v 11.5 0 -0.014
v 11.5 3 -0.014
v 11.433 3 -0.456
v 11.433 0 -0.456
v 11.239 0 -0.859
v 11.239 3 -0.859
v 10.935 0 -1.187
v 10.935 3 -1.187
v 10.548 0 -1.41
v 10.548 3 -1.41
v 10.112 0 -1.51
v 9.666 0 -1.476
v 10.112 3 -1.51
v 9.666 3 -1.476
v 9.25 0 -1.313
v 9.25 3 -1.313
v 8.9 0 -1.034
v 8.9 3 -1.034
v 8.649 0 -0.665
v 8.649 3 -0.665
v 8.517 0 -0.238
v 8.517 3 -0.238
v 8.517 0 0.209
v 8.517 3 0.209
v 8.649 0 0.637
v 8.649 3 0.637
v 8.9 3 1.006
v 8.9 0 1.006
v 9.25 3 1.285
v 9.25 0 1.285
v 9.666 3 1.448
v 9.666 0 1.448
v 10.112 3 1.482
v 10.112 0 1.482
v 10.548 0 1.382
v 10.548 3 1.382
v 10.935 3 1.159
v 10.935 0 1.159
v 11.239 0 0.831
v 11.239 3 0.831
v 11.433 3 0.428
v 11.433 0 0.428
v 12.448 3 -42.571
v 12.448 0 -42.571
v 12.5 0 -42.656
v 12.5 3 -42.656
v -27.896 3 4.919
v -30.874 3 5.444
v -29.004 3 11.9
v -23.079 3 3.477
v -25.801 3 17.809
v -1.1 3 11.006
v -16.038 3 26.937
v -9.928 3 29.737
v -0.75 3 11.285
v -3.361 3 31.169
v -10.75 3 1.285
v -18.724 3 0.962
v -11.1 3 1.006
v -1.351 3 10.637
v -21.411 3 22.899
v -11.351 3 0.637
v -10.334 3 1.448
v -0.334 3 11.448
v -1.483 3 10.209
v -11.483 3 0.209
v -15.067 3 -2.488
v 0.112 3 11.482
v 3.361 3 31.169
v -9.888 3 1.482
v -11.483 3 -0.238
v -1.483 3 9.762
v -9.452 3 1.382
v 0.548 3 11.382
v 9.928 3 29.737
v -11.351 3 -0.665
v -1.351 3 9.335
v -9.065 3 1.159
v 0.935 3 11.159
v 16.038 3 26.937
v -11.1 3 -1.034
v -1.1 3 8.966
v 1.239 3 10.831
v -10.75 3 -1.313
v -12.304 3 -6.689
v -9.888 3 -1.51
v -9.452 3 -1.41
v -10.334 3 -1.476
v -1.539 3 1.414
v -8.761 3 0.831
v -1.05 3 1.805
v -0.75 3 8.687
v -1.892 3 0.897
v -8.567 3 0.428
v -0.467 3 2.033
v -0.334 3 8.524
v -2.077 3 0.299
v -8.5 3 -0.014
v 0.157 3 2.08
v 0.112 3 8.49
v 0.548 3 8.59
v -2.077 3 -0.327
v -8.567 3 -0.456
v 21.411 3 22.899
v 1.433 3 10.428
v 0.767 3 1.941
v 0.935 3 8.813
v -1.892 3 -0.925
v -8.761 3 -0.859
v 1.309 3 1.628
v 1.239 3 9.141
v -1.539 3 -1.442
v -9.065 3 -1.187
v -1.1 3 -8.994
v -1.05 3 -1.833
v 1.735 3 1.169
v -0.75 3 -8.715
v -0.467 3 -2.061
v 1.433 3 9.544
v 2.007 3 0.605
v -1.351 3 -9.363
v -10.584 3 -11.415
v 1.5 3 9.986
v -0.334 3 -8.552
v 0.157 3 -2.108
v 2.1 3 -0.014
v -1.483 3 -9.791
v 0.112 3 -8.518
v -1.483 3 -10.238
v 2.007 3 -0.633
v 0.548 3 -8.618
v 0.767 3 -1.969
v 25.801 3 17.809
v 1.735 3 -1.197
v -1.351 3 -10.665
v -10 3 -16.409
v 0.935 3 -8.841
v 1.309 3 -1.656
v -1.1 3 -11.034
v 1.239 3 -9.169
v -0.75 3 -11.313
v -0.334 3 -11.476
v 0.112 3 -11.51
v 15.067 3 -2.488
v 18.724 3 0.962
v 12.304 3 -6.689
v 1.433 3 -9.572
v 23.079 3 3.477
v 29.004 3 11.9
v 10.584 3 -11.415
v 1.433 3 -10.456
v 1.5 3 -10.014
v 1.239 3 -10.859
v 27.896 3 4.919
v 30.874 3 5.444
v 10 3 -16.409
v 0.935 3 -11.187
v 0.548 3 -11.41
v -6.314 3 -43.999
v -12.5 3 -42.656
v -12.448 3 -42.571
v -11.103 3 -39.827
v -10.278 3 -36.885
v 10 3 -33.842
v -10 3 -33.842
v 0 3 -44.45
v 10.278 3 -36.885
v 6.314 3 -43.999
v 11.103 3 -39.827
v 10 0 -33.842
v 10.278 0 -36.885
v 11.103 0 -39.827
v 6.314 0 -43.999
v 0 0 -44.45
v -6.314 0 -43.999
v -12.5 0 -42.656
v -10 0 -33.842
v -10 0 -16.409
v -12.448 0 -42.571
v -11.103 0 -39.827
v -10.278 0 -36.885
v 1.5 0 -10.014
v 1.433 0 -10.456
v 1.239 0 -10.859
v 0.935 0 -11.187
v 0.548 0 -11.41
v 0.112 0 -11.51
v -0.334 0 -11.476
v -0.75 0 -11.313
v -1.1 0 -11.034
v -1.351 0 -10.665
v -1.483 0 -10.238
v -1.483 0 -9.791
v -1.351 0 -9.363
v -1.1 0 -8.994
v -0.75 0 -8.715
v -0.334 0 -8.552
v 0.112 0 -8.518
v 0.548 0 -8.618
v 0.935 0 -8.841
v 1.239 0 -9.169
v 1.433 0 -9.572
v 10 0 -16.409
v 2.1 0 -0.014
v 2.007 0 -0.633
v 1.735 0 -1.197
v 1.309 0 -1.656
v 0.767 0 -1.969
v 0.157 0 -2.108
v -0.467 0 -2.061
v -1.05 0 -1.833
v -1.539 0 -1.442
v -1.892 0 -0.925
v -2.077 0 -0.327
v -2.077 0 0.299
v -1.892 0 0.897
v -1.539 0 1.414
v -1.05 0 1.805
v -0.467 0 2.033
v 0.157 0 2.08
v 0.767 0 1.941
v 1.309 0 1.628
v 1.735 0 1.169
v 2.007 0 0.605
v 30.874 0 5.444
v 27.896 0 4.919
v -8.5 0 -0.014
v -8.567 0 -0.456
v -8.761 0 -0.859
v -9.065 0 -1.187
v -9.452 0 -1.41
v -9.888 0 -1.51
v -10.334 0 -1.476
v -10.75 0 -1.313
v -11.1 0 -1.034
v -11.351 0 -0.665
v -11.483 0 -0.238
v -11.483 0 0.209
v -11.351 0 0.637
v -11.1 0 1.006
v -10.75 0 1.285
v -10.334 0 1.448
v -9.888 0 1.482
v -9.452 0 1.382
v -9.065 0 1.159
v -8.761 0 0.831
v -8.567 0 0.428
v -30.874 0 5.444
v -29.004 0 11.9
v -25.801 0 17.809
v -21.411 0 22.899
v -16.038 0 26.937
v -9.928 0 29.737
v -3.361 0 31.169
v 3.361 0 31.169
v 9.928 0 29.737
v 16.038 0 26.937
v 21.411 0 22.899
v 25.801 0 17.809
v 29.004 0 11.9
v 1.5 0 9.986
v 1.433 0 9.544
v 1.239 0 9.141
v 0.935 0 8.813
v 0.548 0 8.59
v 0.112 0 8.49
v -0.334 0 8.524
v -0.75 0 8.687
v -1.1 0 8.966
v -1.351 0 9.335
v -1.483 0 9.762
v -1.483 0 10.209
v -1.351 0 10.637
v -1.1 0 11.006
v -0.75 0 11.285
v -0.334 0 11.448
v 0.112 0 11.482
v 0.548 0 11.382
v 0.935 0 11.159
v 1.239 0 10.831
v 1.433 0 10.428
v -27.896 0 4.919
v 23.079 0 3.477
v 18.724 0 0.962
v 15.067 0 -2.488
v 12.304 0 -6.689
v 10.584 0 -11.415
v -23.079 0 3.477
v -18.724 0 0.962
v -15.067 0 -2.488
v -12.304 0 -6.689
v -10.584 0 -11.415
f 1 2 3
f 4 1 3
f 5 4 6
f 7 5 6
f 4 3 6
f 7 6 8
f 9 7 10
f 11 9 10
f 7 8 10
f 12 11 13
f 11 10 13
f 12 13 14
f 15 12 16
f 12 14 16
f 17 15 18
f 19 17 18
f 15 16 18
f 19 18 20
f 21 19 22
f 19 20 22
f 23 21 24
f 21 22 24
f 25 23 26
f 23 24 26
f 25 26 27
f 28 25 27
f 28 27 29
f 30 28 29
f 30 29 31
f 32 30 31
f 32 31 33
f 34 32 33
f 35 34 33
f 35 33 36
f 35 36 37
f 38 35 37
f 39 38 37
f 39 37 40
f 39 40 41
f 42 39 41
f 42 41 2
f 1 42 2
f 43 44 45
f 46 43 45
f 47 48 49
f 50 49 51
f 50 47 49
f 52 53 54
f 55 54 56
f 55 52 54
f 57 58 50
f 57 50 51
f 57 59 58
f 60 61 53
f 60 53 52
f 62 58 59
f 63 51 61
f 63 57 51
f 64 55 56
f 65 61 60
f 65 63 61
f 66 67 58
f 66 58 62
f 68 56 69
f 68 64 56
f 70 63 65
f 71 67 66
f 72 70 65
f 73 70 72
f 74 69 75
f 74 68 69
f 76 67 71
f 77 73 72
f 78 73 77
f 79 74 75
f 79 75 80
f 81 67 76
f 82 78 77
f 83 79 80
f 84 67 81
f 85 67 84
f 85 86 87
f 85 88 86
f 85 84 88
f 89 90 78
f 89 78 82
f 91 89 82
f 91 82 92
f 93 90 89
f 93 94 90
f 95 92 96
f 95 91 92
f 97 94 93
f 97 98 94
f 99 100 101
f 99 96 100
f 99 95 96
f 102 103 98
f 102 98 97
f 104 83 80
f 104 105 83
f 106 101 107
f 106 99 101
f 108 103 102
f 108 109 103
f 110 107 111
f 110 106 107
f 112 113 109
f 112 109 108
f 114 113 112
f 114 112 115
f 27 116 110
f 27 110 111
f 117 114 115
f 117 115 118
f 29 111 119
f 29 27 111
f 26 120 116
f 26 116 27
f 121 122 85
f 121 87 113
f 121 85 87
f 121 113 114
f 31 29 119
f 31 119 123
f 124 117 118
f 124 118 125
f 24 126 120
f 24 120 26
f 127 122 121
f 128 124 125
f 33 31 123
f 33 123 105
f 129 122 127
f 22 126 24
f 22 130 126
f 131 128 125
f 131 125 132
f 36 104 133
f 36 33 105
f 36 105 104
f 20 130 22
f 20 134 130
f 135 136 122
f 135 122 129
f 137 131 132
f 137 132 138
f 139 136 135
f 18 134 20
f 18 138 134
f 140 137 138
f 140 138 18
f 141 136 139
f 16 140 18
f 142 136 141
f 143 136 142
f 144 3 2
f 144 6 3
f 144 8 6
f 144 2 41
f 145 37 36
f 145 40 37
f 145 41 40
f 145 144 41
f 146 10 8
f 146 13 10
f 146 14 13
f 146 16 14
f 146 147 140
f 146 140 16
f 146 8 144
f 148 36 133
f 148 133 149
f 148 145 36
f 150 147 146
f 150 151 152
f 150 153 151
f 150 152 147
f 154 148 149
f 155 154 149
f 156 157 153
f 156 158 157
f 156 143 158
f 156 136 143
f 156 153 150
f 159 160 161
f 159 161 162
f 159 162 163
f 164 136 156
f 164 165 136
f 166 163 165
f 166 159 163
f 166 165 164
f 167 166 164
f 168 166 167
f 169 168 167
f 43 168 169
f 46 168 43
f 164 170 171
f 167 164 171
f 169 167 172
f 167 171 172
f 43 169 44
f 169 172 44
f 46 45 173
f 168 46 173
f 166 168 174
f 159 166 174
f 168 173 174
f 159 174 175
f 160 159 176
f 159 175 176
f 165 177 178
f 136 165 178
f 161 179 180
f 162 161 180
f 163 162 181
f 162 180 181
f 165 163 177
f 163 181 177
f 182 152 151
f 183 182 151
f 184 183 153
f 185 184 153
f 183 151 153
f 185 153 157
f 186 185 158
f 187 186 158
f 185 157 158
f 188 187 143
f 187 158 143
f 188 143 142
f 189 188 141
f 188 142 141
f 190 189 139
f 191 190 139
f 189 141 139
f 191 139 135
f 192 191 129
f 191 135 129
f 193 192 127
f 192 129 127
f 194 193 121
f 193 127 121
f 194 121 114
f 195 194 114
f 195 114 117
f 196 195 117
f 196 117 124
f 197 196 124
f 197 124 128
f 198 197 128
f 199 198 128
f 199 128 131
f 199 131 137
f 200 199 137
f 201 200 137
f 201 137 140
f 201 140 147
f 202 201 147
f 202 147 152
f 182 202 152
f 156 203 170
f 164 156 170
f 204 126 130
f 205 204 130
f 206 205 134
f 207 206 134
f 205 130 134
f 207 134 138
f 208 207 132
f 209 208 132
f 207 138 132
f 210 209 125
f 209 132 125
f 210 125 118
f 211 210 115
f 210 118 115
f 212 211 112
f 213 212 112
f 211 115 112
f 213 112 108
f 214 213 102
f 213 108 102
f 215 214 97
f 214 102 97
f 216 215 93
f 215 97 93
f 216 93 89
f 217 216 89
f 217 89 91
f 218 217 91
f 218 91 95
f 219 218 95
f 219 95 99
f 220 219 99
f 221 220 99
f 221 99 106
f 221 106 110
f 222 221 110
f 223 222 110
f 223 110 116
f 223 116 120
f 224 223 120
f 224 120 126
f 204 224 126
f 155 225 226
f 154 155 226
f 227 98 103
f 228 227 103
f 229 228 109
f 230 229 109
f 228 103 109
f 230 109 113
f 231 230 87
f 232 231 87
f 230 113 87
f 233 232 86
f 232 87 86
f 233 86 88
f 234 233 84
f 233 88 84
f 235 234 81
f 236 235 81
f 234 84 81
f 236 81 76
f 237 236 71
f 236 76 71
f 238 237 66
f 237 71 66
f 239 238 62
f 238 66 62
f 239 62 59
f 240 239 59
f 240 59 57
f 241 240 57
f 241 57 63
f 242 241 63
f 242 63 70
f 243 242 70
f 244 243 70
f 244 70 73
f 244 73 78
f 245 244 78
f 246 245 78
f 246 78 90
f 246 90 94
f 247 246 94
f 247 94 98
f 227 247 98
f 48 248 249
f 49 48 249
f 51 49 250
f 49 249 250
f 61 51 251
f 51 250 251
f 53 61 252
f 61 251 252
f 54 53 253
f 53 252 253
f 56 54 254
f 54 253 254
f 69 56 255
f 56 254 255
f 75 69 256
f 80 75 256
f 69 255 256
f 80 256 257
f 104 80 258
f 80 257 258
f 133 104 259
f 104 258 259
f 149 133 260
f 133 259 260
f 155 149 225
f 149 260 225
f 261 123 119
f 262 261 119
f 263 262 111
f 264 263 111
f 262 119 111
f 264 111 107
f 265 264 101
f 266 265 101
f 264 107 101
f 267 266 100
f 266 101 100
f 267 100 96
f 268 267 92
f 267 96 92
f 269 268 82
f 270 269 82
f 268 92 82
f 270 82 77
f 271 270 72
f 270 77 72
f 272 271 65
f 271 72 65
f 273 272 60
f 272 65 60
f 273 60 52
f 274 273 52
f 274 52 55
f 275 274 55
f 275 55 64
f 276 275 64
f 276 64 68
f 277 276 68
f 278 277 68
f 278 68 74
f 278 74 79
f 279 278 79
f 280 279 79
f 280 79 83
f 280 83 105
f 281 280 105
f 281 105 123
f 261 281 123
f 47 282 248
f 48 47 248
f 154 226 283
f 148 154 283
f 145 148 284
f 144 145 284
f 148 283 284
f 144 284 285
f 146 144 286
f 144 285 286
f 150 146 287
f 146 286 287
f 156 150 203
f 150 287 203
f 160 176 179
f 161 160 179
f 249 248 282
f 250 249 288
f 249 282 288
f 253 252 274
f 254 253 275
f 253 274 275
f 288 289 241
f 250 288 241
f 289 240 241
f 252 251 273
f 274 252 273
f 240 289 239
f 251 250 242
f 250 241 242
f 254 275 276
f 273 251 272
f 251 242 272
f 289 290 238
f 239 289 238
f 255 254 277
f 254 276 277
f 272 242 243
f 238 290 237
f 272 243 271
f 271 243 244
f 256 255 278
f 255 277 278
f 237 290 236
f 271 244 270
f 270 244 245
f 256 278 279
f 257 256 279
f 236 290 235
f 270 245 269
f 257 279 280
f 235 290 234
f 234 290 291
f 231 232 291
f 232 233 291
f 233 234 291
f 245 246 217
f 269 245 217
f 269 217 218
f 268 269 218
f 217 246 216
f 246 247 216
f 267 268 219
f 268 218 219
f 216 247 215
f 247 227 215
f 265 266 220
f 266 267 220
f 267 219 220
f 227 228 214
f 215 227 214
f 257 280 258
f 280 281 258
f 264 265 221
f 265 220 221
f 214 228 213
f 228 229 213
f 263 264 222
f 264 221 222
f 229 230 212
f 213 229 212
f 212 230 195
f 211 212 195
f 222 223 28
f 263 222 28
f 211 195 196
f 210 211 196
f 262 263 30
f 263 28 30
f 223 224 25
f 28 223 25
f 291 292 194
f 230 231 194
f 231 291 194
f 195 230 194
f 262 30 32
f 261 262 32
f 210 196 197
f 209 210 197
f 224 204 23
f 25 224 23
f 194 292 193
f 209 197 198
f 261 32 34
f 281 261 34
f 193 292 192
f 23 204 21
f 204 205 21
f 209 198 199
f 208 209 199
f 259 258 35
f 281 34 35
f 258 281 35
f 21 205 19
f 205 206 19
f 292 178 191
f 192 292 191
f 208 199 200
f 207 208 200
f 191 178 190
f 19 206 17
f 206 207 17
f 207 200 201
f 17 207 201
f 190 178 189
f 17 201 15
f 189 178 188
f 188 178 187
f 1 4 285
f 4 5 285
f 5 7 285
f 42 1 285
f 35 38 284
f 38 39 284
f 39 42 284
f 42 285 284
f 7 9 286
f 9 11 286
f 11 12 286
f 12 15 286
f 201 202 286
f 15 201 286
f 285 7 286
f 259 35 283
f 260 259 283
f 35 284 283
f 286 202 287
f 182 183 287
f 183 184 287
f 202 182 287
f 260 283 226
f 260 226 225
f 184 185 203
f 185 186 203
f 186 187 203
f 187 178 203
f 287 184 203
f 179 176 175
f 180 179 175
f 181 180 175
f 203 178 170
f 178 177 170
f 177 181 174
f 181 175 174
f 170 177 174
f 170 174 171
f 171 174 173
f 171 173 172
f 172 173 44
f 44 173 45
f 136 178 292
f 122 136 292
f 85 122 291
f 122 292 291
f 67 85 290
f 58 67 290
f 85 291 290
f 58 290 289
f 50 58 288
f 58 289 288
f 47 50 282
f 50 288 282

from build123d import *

# Parameters (mm, degrees)
BOSS_EXTRUDE1_DEPTH = 3
SKETCH2_R           = 2.1
SKETCH2_R_2         = 1.5
CUT_EXTRUDE1_DEPTH  = 4


with BuildPart() as part:
    # Sketch1 → Boss-Extrude1 (new body)
    with BuildSketch(Plane(origin=(0, 0, 0), x_dir=(1, 0, 0), z_dir=(0, 1, 0))):
        with BuildLine():
            Line((-12.5, 42.656212912), (-12.447999296, 42.570796715))
            ThreePointArc((-12.447999296, 42.570796715), (-10.623582733, 38.374834362), (-10, 33.842093422))
            Line((-10, 33.842093422), (-10, 16.408985467))
            ThreePointArc((-10, 16.408985467), (-15.066740521, 2.488230295), (-27.896177884, -4.91884882))
            Line((-27.896177884, -4.91884882), (-30.873723057, -5.44387037))
            ThreePointArc((-30.873723057, -5.44387037), (0, -31.35), (30.873723057, -5.44387037))
            Line((30.873723057, -5.44387037), (27.896177884, -4.91884882))
            ThreePointArc((27.896177884, -4.91884882), (15.066740521, 2.488230295), (10, 16.408985467))
            Line((10, 16.408985467), (10, 33.842093422))
            ThreePointArc((10, 33.842093422), (10.623582733, 38.374834362), (12.447999296, 42.570796715))
            Line((12.447999296, 42.570796715), (12.5, 42.656212912))
            ThreePointArc((12.5, 42.656212912), (0, 44.45), (-12.5, 42.656212912))
        make_face()
    extrude(amount=BOSS_EXTRUDE1_DEPTH)

    # Sketch2 → Cut-Extrude1 (cut, through all)
    with BuildSketch(Plane(origin=(0, 3, 0), x_dir=(1, 0, 0), z_dir=(0, 1, 0))):
        with Locations((0, 0.014087551)):
            Circle(SKETCH2_R)
        with Locations((10, 0.014087551)):
            Circle(SKETCH2_R_2)
        with Locations((0, 10.014087551)):
            Circle(SKETCH2_R_2)
        with Locations((-10, 0.014087551)):
            Circle(SKETCH2_R_2)
        with Locations((0, -9.985912449)):
            Circle(SKETCH2_R_2)
    extrude(amount=-CUT_EXTRUDE1_DEPTH, mode=Mode.SUBTRACT)


solid = part.part
